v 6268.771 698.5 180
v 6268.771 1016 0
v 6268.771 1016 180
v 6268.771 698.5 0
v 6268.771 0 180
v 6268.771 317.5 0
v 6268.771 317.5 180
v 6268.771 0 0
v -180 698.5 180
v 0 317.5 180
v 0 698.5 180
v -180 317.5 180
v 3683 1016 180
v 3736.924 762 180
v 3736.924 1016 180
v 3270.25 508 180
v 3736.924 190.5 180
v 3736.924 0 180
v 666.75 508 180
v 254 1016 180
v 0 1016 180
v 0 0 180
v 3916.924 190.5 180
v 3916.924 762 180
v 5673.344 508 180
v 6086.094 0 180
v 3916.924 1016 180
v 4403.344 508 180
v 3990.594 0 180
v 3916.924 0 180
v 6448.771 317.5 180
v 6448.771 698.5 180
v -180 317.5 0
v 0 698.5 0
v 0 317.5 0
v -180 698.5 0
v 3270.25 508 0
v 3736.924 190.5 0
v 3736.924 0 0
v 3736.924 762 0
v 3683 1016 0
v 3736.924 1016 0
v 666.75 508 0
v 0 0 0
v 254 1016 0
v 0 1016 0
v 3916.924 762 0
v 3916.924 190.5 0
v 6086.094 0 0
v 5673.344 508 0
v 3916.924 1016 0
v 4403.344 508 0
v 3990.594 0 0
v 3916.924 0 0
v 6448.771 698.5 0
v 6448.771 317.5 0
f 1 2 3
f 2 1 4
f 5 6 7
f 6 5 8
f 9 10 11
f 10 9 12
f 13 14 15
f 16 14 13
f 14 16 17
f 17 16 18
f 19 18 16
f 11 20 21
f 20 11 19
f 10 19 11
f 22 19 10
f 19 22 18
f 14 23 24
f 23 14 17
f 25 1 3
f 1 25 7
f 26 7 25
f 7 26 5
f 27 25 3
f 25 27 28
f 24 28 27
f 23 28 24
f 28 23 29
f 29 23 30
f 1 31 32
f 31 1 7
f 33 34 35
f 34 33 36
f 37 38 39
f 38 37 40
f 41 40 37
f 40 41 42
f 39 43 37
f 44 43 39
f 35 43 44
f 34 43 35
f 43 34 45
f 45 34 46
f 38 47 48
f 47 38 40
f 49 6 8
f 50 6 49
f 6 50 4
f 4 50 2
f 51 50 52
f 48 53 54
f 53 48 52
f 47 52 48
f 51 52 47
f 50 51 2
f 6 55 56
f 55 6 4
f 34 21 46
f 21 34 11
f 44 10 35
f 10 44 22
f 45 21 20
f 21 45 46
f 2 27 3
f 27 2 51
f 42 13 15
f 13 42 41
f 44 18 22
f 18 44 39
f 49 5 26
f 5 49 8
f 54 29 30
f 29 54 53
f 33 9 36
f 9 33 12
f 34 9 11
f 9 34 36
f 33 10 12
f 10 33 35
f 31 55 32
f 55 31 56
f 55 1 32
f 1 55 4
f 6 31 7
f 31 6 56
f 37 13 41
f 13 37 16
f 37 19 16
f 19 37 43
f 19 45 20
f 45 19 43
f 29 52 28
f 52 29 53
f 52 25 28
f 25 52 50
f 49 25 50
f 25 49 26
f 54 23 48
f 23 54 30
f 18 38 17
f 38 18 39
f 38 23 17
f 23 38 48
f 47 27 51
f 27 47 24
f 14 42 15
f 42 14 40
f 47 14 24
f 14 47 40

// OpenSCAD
// file: global_constants.scad
// unit = 0.1 mm
// 1 inch = 25.4 mm = 254 units

// Dimensions

// Sheet dimensions
sheet_x=24400;
sheet_y=12200;
sheet_z=180;

// Circular cnc routing holes
cnc_circle_r=31.750;
module routing_circle(x,y){
  translate([x,y]) linear_extrude(height=sheet_z) circle(cnc_circle_r);
}

bolt_circle_r=41.0210;
module bolt_circle(x,y){
  translate([x,y]) linear_extrude(height=sheet_z) circle(bolt_circle_r);
}

//Conversion
medievaltometric=254;
metrictomedieval=.0039370078;

// Use the metric system by default
// units="medieval";
units="metric";
// main file
// To render the DXF file from the command line:
// openscad -x handle_arm.dxf -D'units="metric"' handle_arm.scad

include <global_constants.scad>

x1=254;//1" (1.4mm difference from original design)
x2=3736.9242;//14.7123"
x3=3990.5940;//15.7110"
x_max=6268.7708;//24.6802"
x_long_cutout_long_side=13.5*254;
x_long_cutout_short_side=10.25*254;
x_short_cutout_long_side=8.25*254;
x_short_cutout_short_side=5*254;

y1=1.5*254;//1.5"
y_max=1016;//4"

module base(){
// base rectangle + protruding connector rectangles
  union(){
    cube([x_max,y_max,sheet_z], center=true);
    translate([-x_max/2-sheet_z/2,0,0]) cube([sheet_z,y1,sheet_z], center=true);
    translate([x_max/2+sheet_z/2,0,0]) cube([sheet_z,y1,sheet_z], center=true);
  }
}

module long_cutout(){
linear_extrude(height=sheet_z)
  polygon([
    [0,0],
    [(x_long_cutout_long_side-x_long_cutout_short_side)/2,-y_max/2],
    [(x_long_cutout_long_side-x_long_cutout_short_side)/2+x_long_cutout_short_side,-y_max/2],
    [x_long_cutout_long_side,0],
    [0,0]
  ]);
}

module short_cutout(){
linear_extrude(height=sheet_z)
  polygon([
    [0,0],
    [(x_short_cutout_long_side-x_short_cutout_short_side)/2,y_max/2],
    [(x_short_cutout_long_side-x_short_cutout_short_side)/2+x_short_cutout_short_side,y_max/2],
    [x_short_cutout_long_side,0],
    [0,0]
  ]);
}

module handle_arm(){
  render(convexity=10){
    difference(){
      translate([x_max/2,y_max/2,sheet_z/2]) base();
      translate([x1,y_max,0]) long_cutout();
      translate([x3,0,0]) short_cutout();
      translate([x2+sheet_z/2,y_max*3/16/2,sheet_z/2]) cube([sheet_z,y_max*3/16,sheet_z], center=true);
      translate([x2+sheet_z/2,y_max-y_max/4/2,sheet_z/2]) cube([sheet_z,y_max/4,sheet_z], center=true);
    }
  }
}

handle_arm();
